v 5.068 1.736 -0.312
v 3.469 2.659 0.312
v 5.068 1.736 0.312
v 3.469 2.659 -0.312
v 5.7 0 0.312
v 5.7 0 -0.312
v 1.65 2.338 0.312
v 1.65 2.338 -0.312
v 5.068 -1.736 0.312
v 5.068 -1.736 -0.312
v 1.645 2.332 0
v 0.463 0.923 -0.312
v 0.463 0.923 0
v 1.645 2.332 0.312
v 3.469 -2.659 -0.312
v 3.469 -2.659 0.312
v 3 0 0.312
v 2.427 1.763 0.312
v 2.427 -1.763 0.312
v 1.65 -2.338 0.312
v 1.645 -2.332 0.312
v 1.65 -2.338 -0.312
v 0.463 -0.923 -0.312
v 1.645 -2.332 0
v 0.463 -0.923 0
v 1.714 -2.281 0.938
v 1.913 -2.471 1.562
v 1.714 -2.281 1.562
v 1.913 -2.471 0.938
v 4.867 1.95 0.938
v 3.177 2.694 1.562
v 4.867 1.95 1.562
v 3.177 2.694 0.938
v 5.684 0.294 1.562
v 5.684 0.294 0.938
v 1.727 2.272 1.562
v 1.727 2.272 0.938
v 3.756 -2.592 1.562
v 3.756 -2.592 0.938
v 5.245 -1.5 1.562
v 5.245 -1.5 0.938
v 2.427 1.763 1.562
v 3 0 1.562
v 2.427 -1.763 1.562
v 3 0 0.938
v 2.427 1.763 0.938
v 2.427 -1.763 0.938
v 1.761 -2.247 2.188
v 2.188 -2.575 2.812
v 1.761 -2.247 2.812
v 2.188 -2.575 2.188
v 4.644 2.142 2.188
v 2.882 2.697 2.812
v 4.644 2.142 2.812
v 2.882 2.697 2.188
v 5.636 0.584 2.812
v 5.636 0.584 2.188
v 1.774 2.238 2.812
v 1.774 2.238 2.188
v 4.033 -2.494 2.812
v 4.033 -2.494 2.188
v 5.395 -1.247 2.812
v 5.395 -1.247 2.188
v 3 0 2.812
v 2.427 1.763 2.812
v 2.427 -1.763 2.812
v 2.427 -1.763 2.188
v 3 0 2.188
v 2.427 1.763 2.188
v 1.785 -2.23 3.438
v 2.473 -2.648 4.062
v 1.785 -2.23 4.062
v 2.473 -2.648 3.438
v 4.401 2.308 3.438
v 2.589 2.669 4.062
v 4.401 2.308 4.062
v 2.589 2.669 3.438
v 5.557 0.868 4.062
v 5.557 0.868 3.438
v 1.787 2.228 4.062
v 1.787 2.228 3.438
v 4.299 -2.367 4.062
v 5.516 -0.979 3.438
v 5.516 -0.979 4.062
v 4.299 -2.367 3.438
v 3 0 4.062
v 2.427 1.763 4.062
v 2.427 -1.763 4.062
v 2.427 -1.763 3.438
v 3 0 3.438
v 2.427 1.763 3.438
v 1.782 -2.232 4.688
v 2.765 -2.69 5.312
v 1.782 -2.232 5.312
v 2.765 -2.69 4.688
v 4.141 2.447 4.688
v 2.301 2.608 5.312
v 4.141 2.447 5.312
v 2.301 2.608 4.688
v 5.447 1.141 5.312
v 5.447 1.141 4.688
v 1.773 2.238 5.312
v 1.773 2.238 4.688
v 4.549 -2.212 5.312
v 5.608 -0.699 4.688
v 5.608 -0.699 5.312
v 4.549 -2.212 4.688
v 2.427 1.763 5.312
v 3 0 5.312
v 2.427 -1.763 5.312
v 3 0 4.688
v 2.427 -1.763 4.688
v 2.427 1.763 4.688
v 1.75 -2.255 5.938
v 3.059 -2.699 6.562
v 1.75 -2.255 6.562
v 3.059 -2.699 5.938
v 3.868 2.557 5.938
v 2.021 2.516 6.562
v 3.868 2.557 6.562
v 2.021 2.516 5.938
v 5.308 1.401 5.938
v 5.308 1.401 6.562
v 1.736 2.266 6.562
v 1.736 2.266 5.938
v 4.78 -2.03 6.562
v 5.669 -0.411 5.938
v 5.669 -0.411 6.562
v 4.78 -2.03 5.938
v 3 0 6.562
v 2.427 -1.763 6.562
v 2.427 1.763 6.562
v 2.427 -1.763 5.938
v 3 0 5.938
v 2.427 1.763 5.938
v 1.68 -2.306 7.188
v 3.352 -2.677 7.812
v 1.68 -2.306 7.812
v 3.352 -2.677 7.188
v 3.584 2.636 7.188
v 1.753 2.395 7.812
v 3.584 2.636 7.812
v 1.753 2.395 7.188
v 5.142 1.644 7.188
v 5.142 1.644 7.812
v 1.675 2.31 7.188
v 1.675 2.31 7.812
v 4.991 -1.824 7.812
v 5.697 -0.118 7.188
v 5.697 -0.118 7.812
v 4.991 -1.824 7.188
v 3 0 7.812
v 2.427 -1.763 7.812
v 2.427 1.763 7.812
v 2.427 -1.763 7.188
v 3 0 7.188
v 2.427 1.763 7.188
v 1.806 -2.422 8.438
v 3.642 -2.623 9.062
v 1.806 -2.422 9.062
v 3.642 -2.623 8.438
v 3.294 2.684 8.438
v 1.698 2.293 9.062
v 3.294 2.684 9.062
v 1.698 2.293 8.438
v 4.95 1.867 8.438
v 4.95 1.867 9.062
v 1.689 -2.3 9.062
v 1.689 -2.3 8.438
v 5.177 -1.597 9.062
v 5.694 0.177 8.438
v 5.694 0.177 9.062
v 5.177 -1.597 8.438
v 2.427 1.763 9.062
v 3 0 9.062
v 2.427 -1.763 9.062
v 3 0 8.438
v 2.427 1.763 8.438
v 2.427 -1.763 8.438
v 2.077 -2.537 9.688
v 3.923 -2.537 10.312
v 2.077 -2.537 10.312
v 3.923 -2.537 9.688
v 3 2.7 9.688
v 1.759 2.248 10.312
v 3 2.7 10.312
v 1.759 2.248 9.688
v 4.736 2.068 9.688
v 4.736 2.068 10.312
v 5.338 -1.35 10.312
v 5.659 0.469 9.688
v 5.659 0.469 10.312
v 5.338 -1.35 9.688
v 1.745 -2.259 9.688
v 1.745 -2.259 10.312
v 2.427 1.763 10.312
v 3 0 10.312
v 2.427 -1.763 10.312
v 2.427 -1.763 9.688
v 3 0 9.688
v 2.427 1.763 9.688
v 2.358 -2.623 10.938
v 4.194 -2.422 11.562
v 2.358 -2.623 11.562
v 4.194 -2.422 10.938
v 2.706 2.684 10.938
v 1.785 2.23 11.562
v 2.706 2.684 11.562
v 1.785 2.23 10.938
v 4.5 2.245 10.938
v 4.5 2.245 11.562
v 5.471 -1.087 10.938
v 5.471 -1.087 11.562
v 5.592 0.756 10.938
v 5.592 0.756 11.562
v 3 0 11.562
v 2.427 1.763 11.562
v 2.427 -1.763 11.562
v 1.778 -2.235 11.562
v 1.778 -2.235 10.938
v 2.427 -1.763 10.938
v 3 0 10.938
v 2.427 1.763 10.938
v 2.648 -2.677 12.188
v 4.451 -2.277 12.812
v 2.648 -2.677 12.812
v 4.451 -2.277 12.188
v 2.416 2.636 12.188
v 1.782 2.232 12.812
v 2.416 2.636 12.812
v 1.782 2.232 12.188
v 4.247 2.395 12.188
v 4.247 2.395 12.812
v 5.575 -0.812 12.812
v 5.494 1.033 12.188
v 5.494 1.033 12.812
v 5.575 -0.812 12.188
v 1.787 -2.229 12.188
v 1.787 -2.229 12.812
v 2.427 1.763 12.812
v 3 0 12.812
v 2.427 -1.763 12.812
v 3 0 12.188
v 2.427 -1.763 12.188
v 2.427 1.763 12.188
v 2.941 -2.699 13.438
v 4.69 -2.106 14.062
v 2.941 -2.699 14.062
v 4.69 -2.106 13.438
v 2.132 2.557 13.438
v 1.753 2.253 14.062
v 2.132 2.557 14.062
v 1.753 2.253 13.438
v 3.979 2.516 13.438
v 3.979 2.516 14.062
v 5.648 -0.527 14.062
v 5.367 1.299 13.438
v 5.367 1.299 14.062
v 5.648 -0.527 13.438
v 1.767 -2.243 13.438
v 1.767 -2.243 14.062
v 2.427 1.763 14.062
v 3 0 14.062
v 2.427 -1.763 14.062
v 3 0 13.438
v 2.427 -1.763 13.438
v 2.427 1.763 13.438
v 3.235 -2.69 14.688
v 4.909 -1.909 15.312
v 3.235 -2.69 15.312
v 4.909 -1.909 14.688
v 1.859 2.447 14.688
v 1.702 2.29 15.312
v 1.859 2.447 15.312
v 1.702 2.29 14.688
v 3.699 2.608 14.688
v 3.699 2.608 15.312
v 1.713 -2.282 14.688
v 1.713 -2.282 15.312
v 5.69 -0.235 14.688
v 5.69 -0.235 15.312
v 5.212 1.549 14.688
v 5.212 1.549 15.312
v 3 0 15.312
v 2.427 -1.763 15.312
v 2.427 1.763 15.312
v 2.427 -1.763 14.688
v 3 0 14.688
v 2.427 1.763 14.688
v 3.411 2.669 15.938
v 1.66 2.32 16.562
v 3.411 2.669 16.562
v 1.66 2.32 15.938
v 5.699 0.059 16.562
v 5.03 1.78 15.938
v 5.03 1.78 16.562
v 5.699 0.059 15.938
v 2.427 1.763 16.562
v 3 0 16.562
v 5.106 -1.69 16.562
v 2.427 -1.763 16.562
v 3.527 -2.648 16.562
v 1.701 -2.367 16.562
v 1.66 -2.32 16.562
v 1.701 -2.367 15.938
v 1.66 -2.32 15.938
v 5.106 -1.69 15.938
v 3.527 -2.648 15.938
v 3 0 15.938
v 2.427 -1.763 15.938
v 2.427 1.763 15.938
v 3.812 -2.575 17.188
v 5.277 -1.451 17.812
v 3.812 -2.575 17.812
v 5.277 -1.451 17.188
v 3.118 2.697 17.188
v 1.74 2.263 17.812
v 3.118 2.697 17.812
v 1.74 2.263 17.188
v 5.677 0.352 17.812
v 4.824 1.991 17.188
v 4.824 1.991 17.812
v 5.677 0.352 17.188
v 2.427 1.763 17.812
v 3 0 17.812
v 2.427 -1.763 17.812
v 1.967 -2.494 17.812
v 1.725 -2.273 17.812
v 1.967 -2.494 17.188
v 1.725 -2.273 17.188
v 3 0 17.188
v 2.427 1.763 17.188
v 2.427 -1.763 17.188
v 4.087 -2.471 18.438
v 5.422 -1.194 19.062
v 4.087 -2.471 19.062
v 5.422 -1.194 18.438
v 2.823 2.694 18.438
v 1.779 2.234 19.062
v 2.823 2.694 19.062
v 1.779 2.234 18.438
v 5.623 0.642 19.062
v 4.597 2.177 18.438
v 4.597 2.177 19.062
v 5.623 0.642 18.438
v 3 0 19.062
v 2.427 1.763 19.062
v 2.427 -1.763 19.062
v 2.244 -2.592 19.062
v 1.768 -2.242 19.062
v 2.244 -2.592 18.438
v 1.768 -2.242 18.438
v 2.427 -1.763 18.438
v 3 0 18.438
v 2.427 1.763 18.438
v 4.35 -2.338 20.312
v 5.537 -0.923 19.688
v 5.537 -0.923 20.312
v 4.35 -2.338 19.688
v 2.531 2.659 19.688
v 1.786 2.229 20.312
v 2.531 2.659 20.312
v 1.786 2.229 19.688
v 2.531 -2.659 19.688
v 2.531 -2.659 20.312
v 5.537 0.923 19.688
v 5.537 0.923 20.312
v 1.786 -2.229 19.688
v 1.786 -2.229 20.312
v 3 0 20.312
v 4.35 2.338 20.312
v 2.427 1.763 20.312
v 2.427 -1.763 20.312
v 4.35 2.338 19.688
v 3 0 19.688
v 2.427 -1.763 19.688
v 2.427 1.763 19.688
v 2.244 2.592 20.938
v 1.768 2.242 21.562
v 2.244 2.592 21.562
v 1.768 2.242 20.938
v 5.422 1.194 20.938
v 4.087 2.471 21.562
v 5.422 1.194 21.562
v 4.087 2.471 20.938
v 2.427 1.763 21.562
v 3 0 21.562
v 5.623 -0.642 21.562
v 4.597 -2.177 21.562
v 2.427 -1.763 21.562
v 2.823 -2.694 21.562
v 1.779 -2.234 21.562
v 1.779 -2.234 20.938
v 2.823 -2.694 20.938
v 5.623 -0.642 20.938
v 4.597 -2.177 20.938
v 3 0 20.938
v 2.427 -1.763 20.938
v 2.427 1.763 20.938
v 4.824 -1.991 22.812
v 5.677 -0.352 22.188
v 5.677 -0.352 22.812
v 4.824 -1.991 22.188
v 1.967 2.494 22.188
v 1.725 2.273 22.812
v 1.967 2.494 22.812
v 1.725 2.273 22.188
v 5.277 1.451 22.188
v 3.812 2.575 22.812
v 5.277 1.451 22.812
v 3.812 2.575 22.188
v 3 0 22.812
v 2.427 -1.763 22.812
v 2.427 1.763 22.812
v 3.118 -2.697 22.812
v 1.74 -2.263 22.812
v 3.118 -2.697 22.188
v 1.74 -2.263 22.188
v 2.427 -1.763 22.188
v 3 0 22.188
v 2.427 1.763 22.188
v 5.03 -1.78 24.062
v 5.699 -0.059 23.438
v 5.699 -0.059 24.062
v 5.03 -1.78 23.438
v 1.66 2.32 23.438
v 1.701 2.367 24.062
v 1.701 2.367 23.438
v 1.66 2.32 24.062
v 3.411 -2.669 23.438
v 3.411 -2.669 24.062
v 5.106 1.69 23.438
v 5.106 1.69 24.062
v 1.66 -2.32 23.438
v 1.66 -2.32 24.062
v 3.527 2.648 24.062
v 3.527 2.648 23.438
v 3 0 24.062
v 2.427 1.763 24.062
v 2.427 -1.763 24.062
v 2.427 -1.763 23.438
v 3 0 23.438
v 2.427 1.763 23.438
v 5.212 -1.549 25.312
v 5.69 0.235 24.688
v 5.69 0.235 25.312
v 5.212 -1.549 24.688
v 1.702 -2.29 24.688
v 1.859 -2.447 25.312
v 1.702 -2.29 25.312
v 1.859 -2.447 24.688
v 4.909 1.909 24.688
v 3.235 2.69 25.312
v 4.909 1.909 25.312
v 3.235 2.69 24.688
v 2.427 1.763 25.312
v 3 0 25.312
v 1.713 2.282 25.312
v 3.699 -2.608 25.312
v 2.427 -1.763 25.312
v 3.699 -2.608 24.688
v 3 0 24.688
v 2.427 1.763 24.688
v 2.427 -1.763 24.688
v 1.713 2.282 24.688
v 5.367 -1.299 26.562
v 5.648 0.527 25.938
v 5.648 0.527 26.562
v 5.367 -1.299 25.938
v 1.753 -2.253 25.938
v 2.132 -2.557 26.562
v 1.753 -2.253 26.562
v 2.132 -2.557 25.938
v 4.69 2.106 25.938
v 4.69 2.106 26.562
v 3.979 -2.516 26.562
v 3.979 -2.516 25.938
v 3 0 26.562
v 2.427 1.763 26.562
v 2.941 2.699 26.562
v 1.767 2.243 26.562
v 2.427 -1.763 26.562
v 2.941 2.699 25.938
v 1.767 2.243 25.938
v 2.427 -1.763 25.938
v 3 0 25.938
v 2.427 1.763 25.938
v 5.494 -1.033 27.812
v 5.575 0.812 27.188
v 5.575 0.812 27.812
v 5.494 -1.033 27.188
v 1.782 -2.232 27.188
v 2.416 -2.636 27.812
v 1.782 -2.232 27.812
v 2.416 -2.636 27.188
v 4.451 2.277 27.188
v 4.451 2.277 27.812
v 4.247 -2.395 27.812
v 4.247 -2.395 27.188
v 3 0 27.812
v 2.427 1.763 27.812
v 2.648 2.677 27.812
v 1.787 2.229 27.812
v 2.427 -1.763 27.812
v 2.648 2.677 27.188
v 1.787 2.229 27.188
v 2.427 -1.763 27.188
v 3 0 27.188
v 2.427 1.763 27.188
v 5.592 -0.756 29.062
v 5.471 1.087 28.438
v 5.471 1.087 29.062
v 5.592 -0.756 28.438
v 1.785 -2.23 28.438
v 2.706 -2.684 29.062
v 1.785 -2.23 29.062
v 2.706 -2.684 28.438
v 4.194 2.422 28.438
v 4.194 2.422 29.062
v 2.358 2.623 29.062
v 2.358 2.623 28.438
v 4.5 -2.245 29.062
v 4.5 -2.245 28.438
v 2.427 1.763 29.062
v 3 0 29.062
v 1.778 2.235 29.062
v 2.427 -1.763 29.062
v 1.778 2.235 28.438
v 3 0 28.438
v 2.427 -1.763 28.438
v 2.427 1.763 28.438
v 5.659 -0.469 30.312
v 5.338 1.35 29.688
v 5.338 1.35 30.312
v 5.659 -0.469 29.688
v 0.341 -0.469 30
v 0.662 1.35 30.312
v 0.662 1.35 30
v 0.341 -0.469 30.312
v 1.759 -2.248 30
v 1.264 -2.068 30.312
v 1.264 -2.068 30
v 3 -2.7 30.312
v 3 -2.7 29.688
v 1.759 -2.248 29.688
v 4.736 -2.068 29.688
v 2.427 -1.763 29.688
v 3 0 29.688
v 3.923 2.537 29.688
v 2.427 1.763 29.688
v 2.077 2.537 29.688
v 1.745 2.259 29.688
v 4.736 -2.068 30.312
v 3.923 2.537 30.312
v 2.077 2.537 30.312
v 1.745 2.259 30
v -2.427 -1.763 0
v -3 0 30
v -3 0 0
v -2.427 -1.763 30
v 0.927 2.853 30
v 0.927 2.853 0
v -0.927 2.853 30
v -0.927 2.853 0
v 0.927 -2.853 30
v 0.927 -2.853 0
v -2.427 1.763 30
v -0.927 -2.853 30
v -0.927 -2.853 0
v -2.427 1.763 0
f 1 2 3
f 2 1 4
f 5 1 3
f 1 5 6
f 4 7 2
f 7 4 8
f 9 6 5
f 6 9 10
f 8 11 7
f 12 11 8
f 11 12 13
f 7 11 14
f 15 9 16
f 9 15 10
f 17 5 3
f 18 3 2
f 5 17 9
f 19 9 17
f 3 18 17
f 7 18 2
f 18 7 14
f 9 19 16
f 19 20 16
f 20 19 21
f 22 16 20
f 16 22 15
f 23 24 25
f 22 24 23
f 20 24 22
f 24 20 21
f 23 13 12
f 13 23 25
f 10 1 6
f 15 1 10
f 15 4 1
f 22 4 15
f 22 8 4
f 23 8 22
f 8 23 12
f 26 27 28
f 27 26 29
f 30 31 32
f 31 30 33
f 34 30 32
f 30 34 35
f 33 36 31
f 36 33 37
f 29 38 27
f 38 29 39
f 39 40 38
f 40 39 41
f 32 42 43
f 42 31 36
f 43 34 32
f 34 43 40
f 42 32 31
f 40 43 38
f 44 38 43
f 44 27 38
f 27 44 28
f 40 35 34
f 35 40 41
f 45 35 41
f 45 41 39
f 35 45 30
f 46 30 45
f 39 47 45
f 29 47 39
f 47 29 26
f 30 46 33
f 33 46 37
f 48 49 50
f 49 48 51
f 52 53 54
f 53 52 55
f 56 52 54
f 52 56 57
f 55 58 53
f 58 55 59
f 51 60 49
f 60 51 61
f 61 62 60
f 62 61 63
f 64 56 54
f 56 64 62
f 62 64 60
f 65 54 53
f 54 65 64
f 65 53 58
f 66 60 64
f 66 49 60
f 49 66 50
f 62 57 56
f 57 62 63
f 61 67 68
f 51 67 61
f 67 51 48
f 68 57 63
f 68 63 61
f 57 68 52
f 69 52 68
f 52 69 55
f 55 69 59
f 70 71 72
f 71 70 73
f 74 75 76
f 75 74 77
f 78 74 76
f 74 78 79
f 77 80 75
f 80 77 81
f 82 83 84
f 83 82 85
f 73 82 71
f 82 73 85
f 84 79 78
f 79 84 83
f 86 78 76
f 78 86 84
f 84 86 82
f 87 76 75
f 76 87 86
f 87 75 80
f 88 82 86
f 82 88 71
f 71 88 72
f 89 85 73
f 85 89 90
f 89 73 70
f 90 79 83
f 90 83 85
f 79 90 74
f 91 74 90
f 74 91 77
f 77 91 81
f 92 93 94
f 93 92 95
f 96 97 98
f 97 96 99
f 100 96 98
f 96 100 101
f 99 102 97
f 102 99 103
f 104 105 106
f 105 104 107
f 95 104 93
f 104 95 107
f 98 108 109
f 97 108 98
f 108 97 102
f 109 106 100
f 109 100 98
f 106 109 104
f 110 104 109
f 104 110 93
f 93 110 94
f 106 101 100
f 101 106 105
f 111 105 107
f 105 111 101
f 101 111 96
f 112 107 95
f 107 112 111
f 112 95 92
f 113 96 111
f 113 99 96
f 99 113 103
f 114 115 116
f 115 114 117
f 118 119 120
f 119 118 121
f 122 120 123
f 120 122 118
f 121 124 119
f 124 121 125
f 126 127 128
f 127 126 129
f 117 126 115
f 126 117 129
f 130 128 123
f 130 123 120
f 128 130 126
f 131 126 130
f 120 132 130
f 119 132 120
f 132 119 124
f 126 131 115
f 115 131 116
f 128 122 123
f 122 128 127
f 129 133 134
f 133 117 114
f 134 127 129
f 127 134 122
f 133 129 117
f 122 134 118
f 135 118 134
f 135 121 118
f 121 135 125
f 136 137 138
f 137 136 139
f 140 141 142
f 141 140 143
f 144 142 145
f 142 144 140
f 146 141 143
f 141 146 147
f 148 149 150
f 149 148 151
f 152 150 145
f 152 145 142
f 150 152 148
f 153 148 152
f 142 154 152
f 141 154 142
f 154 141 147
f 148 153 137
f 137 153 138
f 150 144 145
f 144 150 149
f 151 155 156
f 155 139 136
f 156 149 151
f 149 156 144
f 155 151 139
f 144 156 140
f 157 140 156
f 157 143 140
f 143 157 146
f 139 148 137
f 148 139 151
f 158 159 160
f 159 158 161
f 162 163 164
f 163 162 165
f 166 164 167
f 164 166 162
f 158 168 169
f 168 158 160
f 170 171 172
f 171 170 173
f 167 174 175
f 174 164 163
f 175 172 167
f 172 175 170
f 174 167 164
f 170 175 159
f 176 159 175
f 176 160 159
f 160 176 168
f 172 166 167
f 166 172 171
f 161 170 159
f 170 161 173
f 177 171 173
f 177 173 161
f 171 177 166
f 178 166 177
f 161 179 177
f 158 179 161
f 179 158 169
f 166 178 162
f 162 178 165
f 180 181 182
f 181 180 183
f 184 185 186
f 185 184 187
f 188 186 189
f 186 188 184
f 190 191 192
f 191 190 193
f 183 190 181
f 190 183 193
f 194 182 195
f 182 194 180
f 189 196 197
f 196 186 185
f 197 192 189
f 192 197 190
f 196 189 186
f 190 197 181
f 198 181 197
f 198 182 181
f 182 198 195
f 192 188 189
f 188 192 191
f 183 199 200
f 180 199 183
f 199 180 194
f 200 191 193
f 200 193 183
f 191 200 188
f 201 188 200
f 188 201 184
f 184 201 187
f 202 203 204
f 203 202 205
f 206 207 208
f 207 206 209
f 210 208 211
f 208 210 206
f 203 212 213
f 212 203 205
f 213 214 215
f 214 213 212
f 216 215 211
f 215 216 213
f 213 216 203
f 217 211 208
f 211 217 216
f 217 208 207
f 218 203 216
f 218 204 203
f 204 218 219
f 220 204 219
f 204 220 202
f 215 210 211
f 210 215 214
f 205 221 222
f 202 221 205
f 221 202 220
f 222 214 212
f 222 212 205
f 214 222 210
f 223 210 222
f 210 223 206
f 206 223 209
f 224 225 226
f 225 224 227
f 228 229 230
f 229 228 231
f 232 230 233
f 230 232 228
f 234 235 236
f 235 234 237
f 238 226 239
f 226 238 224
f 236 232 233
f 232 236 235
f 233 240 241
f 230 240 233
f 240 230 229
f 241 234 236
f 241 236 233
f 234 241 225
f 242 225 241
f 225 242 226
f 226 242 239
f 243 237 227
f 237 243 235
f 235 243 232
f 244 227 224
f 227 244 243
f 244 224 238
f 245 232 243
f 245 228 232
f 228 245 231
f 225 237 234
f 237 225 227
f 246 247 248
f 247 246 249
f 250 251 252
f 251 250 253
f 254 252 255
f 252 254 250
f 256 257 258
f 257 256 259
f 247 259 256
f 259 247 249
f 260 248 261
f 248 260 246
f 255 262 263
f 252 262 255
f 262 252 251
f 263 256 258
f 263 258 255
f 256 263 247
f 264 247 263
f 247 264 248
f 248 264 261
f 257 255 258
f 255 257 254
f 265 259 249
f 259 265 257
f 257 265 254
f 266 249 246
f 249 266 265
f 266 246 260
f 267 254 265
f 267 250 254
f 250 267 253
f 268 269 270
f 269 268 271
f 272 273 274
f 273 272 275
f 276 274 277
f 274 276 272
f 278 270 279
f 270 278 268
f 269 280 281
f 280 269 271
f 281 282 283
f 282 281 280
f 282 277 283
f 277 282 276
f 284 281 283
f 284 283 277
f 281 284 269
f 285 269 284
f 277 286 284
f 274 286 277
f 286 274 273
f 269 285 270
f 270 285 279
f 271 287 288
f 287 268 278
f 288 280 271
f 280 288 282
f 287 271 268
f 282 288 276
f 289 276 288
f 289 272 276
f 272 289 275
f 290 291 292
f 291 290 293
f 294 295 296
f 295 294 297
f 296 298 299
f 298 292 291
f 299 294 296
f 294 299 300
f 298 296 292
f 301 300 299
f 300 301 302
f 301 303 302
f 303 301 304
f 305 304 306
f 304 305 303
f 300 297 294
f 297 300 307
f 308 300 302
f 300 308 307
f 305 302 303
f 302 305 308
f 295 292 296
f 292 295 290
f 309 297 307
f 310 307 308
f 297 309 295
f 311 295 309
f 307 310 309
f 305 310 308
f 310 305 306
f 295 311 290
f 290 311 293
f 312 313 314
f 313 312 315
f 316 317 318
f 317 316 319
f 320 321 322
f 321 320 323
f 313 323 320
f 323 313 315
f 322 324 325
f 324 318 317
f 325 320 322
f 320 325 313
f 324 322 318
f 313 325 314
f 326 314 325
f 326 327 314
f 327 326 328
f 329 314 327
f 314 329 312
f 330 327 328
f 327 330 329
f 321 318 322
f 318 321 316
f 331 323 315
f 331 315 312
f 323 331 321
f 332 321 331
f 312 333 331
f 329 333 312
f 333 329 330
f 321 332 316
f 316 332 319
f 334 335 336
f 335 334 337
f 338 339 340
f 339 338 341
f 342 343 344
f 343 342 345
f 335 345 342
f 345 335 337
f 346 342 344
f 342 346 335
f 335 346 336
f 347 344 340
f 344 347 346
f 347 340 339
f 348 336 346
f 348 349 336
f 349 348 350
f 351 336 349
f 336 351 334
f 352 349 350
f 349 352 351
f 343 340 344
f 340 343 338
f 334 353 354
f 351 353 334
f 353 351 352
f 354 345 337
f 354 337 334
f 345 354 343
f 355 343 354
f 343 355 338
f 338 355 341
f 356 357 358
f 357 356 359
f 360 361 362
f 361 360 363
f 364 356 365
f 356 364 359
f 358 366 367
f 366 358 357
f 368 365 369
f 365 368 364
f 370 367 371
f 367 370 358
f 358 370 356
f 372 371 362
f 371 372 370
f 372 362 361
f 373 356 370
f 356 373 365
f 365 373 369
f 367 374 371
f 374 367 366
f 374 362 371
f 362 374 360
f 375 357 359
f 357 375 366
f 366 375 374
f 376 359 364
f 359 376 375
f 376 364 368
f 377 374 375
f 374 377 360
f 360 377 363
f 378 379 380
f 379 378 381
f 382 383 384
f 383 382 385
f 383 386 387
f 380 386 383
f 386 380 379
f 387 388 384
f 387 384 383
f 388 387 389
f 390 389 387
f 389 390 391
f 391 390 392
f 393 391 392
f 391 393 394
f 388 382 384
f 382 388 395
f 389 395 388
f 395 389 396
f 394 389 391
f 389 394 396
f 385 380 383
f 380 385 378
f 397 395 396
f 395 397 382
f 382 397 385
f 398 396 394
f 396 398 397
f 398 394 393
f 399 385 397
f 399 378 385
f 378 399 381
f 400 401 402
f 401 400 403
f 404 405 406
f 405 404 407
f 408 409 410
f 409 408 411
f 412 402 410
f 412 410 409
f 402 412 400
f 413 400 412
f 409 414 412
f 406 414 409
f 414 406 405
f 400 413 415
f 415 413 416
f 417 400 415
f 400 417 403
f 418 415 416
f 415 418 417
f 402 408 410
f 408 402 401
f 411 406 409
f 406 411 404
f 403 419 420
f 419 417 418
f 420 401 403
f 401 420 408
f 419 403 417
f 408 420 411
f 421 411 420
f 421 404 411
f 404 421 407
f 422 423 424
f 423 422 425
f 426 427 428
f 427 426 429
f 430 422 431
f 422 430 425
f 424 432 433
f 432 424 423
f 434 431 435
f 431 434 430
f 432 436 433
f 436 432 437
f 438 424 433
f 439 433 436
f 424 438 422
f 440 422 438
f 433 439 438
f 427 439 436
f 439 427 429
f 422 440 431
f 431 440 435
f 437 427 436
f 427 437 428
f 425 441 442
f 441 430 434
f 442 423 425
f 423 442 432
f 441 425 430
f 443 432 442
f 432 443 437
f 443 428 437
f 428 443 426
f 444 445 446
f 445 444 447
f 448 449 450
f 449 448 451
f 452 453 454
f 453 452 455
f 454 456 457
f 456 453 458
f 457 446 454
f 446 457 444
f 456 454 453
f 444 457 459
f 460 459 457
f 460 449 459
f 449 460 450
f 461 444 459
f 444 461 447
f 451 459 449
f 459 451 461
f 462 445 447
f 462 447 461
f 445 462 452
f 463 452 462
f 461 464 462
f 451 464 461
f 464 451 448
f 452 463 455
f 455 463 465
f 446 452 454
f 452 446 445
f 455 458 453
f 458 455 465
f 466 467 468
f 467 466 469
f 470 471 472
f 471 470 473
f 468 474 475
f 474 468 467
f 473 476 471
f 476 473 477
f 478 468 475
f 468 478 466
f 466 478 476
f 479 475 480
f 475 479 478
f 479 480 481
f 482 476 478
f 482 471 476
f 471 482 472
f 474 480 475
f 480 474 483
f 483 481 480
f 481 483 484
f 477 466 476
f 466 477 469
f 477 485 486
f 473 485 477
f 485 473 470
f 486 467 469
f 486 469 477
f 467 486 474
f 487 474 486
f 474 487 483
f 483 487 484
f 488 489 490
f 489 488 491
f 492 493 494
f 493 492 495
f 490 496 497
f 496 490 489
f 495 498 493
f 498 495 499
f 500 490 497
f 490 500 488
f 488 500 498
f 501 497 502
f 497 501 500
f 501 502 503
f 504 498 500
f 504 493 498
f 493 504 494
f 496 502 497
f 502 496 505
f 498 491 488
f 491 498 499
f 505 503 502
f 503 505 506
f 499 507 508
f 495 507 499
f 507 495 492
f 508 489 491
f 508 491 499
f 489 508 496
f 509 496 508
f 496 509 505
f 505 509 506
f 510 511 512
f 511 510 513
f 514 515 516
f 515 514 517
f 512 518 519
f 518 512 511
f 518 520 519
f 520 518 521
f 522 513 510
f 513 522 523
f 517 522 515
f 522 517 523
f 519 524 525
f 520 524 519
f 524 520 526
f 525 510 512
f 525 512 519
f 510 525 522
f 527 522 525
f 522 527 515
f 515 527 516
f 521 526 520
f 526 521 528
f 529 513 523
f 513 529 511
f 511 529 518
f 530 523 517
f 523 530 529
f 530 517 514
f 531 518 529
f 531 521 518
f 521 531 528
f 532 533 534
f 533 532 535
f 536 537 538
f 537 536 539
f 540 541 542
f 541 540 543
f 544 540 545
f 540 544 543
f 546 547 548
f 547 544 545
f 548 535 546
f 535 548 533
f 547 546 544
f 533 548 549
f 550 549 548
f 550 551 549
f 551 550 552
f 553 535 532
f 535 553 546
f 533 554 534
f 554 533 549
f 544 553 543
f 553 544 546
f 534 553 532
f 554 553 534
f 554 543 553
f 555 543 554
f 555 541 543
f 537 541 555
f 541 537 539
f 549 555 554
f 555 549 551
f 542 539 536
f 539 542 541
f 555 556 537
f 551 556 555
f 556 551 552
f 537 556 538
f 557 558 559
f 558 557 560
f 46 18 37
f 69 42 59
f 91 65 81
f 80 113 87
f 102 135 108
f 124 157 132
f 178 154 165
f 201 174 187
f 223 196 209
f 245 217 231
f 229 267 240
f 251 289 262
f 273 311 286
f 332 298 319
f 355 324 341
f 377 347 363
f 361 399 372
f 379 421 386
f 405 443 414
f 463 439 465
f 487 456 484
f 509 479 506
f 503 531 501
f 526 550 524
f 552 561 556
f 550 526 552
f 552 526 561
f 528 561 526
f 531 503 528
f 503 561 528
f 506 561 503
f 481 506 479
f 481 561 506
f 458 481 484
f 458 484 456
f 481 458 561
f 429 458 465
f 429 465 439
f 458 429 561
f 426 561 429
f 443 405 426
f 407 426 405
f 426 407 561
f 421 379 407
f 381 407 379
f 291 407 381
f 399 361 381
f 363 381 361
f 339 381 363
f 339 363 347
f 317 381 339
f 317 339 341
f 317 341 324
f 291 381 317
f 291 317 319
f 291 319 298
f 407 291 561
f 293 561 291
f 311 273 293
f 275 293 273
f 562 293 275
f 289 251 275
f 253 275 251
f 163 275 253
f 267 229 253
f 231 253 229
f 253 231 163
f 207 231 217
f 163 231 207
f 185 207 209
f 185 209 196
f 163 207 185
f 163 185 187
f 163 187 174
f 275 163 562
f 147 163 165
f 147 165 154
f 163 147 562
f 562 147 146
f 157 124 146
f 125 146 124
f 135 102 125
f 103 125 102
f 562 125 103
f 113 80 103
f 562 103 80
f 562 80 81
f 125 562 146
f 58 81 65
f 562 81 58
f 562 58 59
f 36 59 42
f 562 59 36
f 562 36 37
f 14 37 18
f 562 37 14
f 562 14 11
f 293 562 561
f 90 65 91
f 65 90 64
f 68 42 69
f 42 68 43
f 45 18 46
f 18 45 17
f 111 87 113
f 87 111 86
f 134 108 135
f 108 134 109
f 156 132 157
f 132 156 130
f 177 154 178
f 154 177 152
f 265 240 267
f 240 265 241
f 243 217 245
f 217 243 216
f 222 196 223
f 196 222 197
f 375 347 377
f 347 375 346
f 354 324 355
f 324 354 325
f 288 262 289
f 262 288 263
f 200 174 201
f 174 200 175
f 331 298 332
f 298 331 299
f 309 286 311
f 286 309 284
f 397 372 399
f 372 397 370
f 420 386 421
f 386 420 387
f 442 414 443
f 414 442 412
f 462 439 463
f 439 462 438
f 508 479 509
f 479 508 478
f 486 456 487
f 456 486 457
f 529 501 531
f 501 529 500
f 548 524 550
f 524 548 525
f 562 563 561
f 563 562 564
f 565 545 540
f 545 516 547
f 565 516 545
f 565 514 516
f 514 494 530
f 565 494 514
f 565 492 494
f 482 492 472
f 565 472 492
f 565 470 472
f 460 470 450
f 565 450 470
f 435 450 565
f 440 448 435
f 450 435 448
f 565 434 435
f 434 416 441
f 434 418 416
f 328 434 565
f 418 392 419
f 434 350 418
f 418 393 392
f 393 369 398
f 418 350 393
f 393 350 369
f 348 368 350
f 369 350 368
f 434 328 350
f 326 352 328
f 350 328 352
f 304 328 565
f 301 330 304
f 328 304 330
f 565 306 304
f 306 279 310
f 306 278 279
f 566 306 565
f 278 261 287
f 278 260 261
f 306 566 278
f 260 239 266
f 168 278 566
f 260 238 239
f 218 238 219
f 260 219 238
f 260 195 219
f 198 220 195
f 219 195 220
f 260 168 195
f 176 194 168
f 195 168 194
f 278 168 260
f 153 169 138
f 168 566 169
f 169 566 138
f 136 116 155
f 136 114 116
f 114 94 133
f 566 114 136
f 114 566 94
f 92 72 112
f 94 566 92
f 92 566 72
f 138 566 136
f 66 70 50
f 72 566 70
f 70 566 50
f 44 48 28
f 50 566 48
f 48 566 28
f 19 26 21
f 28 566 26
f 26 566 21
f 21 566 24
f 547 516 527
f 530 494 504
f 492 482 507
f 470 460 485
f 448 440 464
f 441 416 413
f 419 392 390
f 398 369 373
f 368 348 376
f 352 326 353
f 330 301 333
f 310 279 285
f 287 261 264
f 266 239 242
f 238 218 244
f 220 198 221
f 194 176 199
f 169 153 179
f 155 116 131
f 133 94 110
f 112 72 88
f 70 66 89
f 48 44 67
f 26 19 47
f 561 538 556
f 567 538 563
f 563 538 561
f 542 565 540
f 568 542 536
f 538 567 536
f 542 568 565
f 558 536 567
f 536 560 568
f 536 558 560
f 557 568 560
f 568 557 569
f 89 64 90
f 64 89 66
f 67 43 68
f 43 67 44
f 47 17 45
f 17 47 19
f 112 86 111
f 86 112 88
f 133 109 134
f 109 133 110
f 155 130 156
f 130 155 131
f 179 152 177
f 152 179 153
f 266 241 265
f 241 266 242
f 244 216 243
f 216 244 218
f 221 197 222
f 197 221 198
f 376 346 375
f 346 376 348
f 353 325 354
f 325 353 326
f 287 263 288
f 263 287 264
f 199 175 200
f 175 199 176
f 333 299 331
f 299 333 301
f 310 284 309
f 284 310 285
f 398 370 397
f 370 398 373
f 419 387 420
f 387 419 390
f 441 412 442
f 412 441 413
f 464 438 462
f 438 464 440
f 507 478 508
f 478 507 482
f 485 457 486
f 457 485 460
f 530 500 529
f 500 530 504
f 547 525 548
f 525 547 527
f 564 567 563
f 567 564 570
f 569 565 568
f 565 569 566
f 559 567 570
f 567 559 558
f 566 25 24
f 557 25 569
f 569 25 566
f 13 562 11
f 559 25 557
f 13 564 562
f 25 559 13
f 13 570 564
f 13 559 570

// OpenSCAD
function paso_metrico(n) = n * 1.25; // Relación estándar

module tornillo(diametro, largo, rosca) {
    cylinder(h=largo, d=diametro);
    
    // Simulación de rosca usando el paso
    for (h = [0:paso_metrico(rosca):largo]) {
        translate([diametro/2, 0, h])
            rotate([0, 0, h * 5]) 
                cylinder(h=paso_metrico(rosca)/2, d=diametro*0.9, center=true);
    }
}

// Tornillo M6 con paso 1
tornillo(6, 30, 1);
